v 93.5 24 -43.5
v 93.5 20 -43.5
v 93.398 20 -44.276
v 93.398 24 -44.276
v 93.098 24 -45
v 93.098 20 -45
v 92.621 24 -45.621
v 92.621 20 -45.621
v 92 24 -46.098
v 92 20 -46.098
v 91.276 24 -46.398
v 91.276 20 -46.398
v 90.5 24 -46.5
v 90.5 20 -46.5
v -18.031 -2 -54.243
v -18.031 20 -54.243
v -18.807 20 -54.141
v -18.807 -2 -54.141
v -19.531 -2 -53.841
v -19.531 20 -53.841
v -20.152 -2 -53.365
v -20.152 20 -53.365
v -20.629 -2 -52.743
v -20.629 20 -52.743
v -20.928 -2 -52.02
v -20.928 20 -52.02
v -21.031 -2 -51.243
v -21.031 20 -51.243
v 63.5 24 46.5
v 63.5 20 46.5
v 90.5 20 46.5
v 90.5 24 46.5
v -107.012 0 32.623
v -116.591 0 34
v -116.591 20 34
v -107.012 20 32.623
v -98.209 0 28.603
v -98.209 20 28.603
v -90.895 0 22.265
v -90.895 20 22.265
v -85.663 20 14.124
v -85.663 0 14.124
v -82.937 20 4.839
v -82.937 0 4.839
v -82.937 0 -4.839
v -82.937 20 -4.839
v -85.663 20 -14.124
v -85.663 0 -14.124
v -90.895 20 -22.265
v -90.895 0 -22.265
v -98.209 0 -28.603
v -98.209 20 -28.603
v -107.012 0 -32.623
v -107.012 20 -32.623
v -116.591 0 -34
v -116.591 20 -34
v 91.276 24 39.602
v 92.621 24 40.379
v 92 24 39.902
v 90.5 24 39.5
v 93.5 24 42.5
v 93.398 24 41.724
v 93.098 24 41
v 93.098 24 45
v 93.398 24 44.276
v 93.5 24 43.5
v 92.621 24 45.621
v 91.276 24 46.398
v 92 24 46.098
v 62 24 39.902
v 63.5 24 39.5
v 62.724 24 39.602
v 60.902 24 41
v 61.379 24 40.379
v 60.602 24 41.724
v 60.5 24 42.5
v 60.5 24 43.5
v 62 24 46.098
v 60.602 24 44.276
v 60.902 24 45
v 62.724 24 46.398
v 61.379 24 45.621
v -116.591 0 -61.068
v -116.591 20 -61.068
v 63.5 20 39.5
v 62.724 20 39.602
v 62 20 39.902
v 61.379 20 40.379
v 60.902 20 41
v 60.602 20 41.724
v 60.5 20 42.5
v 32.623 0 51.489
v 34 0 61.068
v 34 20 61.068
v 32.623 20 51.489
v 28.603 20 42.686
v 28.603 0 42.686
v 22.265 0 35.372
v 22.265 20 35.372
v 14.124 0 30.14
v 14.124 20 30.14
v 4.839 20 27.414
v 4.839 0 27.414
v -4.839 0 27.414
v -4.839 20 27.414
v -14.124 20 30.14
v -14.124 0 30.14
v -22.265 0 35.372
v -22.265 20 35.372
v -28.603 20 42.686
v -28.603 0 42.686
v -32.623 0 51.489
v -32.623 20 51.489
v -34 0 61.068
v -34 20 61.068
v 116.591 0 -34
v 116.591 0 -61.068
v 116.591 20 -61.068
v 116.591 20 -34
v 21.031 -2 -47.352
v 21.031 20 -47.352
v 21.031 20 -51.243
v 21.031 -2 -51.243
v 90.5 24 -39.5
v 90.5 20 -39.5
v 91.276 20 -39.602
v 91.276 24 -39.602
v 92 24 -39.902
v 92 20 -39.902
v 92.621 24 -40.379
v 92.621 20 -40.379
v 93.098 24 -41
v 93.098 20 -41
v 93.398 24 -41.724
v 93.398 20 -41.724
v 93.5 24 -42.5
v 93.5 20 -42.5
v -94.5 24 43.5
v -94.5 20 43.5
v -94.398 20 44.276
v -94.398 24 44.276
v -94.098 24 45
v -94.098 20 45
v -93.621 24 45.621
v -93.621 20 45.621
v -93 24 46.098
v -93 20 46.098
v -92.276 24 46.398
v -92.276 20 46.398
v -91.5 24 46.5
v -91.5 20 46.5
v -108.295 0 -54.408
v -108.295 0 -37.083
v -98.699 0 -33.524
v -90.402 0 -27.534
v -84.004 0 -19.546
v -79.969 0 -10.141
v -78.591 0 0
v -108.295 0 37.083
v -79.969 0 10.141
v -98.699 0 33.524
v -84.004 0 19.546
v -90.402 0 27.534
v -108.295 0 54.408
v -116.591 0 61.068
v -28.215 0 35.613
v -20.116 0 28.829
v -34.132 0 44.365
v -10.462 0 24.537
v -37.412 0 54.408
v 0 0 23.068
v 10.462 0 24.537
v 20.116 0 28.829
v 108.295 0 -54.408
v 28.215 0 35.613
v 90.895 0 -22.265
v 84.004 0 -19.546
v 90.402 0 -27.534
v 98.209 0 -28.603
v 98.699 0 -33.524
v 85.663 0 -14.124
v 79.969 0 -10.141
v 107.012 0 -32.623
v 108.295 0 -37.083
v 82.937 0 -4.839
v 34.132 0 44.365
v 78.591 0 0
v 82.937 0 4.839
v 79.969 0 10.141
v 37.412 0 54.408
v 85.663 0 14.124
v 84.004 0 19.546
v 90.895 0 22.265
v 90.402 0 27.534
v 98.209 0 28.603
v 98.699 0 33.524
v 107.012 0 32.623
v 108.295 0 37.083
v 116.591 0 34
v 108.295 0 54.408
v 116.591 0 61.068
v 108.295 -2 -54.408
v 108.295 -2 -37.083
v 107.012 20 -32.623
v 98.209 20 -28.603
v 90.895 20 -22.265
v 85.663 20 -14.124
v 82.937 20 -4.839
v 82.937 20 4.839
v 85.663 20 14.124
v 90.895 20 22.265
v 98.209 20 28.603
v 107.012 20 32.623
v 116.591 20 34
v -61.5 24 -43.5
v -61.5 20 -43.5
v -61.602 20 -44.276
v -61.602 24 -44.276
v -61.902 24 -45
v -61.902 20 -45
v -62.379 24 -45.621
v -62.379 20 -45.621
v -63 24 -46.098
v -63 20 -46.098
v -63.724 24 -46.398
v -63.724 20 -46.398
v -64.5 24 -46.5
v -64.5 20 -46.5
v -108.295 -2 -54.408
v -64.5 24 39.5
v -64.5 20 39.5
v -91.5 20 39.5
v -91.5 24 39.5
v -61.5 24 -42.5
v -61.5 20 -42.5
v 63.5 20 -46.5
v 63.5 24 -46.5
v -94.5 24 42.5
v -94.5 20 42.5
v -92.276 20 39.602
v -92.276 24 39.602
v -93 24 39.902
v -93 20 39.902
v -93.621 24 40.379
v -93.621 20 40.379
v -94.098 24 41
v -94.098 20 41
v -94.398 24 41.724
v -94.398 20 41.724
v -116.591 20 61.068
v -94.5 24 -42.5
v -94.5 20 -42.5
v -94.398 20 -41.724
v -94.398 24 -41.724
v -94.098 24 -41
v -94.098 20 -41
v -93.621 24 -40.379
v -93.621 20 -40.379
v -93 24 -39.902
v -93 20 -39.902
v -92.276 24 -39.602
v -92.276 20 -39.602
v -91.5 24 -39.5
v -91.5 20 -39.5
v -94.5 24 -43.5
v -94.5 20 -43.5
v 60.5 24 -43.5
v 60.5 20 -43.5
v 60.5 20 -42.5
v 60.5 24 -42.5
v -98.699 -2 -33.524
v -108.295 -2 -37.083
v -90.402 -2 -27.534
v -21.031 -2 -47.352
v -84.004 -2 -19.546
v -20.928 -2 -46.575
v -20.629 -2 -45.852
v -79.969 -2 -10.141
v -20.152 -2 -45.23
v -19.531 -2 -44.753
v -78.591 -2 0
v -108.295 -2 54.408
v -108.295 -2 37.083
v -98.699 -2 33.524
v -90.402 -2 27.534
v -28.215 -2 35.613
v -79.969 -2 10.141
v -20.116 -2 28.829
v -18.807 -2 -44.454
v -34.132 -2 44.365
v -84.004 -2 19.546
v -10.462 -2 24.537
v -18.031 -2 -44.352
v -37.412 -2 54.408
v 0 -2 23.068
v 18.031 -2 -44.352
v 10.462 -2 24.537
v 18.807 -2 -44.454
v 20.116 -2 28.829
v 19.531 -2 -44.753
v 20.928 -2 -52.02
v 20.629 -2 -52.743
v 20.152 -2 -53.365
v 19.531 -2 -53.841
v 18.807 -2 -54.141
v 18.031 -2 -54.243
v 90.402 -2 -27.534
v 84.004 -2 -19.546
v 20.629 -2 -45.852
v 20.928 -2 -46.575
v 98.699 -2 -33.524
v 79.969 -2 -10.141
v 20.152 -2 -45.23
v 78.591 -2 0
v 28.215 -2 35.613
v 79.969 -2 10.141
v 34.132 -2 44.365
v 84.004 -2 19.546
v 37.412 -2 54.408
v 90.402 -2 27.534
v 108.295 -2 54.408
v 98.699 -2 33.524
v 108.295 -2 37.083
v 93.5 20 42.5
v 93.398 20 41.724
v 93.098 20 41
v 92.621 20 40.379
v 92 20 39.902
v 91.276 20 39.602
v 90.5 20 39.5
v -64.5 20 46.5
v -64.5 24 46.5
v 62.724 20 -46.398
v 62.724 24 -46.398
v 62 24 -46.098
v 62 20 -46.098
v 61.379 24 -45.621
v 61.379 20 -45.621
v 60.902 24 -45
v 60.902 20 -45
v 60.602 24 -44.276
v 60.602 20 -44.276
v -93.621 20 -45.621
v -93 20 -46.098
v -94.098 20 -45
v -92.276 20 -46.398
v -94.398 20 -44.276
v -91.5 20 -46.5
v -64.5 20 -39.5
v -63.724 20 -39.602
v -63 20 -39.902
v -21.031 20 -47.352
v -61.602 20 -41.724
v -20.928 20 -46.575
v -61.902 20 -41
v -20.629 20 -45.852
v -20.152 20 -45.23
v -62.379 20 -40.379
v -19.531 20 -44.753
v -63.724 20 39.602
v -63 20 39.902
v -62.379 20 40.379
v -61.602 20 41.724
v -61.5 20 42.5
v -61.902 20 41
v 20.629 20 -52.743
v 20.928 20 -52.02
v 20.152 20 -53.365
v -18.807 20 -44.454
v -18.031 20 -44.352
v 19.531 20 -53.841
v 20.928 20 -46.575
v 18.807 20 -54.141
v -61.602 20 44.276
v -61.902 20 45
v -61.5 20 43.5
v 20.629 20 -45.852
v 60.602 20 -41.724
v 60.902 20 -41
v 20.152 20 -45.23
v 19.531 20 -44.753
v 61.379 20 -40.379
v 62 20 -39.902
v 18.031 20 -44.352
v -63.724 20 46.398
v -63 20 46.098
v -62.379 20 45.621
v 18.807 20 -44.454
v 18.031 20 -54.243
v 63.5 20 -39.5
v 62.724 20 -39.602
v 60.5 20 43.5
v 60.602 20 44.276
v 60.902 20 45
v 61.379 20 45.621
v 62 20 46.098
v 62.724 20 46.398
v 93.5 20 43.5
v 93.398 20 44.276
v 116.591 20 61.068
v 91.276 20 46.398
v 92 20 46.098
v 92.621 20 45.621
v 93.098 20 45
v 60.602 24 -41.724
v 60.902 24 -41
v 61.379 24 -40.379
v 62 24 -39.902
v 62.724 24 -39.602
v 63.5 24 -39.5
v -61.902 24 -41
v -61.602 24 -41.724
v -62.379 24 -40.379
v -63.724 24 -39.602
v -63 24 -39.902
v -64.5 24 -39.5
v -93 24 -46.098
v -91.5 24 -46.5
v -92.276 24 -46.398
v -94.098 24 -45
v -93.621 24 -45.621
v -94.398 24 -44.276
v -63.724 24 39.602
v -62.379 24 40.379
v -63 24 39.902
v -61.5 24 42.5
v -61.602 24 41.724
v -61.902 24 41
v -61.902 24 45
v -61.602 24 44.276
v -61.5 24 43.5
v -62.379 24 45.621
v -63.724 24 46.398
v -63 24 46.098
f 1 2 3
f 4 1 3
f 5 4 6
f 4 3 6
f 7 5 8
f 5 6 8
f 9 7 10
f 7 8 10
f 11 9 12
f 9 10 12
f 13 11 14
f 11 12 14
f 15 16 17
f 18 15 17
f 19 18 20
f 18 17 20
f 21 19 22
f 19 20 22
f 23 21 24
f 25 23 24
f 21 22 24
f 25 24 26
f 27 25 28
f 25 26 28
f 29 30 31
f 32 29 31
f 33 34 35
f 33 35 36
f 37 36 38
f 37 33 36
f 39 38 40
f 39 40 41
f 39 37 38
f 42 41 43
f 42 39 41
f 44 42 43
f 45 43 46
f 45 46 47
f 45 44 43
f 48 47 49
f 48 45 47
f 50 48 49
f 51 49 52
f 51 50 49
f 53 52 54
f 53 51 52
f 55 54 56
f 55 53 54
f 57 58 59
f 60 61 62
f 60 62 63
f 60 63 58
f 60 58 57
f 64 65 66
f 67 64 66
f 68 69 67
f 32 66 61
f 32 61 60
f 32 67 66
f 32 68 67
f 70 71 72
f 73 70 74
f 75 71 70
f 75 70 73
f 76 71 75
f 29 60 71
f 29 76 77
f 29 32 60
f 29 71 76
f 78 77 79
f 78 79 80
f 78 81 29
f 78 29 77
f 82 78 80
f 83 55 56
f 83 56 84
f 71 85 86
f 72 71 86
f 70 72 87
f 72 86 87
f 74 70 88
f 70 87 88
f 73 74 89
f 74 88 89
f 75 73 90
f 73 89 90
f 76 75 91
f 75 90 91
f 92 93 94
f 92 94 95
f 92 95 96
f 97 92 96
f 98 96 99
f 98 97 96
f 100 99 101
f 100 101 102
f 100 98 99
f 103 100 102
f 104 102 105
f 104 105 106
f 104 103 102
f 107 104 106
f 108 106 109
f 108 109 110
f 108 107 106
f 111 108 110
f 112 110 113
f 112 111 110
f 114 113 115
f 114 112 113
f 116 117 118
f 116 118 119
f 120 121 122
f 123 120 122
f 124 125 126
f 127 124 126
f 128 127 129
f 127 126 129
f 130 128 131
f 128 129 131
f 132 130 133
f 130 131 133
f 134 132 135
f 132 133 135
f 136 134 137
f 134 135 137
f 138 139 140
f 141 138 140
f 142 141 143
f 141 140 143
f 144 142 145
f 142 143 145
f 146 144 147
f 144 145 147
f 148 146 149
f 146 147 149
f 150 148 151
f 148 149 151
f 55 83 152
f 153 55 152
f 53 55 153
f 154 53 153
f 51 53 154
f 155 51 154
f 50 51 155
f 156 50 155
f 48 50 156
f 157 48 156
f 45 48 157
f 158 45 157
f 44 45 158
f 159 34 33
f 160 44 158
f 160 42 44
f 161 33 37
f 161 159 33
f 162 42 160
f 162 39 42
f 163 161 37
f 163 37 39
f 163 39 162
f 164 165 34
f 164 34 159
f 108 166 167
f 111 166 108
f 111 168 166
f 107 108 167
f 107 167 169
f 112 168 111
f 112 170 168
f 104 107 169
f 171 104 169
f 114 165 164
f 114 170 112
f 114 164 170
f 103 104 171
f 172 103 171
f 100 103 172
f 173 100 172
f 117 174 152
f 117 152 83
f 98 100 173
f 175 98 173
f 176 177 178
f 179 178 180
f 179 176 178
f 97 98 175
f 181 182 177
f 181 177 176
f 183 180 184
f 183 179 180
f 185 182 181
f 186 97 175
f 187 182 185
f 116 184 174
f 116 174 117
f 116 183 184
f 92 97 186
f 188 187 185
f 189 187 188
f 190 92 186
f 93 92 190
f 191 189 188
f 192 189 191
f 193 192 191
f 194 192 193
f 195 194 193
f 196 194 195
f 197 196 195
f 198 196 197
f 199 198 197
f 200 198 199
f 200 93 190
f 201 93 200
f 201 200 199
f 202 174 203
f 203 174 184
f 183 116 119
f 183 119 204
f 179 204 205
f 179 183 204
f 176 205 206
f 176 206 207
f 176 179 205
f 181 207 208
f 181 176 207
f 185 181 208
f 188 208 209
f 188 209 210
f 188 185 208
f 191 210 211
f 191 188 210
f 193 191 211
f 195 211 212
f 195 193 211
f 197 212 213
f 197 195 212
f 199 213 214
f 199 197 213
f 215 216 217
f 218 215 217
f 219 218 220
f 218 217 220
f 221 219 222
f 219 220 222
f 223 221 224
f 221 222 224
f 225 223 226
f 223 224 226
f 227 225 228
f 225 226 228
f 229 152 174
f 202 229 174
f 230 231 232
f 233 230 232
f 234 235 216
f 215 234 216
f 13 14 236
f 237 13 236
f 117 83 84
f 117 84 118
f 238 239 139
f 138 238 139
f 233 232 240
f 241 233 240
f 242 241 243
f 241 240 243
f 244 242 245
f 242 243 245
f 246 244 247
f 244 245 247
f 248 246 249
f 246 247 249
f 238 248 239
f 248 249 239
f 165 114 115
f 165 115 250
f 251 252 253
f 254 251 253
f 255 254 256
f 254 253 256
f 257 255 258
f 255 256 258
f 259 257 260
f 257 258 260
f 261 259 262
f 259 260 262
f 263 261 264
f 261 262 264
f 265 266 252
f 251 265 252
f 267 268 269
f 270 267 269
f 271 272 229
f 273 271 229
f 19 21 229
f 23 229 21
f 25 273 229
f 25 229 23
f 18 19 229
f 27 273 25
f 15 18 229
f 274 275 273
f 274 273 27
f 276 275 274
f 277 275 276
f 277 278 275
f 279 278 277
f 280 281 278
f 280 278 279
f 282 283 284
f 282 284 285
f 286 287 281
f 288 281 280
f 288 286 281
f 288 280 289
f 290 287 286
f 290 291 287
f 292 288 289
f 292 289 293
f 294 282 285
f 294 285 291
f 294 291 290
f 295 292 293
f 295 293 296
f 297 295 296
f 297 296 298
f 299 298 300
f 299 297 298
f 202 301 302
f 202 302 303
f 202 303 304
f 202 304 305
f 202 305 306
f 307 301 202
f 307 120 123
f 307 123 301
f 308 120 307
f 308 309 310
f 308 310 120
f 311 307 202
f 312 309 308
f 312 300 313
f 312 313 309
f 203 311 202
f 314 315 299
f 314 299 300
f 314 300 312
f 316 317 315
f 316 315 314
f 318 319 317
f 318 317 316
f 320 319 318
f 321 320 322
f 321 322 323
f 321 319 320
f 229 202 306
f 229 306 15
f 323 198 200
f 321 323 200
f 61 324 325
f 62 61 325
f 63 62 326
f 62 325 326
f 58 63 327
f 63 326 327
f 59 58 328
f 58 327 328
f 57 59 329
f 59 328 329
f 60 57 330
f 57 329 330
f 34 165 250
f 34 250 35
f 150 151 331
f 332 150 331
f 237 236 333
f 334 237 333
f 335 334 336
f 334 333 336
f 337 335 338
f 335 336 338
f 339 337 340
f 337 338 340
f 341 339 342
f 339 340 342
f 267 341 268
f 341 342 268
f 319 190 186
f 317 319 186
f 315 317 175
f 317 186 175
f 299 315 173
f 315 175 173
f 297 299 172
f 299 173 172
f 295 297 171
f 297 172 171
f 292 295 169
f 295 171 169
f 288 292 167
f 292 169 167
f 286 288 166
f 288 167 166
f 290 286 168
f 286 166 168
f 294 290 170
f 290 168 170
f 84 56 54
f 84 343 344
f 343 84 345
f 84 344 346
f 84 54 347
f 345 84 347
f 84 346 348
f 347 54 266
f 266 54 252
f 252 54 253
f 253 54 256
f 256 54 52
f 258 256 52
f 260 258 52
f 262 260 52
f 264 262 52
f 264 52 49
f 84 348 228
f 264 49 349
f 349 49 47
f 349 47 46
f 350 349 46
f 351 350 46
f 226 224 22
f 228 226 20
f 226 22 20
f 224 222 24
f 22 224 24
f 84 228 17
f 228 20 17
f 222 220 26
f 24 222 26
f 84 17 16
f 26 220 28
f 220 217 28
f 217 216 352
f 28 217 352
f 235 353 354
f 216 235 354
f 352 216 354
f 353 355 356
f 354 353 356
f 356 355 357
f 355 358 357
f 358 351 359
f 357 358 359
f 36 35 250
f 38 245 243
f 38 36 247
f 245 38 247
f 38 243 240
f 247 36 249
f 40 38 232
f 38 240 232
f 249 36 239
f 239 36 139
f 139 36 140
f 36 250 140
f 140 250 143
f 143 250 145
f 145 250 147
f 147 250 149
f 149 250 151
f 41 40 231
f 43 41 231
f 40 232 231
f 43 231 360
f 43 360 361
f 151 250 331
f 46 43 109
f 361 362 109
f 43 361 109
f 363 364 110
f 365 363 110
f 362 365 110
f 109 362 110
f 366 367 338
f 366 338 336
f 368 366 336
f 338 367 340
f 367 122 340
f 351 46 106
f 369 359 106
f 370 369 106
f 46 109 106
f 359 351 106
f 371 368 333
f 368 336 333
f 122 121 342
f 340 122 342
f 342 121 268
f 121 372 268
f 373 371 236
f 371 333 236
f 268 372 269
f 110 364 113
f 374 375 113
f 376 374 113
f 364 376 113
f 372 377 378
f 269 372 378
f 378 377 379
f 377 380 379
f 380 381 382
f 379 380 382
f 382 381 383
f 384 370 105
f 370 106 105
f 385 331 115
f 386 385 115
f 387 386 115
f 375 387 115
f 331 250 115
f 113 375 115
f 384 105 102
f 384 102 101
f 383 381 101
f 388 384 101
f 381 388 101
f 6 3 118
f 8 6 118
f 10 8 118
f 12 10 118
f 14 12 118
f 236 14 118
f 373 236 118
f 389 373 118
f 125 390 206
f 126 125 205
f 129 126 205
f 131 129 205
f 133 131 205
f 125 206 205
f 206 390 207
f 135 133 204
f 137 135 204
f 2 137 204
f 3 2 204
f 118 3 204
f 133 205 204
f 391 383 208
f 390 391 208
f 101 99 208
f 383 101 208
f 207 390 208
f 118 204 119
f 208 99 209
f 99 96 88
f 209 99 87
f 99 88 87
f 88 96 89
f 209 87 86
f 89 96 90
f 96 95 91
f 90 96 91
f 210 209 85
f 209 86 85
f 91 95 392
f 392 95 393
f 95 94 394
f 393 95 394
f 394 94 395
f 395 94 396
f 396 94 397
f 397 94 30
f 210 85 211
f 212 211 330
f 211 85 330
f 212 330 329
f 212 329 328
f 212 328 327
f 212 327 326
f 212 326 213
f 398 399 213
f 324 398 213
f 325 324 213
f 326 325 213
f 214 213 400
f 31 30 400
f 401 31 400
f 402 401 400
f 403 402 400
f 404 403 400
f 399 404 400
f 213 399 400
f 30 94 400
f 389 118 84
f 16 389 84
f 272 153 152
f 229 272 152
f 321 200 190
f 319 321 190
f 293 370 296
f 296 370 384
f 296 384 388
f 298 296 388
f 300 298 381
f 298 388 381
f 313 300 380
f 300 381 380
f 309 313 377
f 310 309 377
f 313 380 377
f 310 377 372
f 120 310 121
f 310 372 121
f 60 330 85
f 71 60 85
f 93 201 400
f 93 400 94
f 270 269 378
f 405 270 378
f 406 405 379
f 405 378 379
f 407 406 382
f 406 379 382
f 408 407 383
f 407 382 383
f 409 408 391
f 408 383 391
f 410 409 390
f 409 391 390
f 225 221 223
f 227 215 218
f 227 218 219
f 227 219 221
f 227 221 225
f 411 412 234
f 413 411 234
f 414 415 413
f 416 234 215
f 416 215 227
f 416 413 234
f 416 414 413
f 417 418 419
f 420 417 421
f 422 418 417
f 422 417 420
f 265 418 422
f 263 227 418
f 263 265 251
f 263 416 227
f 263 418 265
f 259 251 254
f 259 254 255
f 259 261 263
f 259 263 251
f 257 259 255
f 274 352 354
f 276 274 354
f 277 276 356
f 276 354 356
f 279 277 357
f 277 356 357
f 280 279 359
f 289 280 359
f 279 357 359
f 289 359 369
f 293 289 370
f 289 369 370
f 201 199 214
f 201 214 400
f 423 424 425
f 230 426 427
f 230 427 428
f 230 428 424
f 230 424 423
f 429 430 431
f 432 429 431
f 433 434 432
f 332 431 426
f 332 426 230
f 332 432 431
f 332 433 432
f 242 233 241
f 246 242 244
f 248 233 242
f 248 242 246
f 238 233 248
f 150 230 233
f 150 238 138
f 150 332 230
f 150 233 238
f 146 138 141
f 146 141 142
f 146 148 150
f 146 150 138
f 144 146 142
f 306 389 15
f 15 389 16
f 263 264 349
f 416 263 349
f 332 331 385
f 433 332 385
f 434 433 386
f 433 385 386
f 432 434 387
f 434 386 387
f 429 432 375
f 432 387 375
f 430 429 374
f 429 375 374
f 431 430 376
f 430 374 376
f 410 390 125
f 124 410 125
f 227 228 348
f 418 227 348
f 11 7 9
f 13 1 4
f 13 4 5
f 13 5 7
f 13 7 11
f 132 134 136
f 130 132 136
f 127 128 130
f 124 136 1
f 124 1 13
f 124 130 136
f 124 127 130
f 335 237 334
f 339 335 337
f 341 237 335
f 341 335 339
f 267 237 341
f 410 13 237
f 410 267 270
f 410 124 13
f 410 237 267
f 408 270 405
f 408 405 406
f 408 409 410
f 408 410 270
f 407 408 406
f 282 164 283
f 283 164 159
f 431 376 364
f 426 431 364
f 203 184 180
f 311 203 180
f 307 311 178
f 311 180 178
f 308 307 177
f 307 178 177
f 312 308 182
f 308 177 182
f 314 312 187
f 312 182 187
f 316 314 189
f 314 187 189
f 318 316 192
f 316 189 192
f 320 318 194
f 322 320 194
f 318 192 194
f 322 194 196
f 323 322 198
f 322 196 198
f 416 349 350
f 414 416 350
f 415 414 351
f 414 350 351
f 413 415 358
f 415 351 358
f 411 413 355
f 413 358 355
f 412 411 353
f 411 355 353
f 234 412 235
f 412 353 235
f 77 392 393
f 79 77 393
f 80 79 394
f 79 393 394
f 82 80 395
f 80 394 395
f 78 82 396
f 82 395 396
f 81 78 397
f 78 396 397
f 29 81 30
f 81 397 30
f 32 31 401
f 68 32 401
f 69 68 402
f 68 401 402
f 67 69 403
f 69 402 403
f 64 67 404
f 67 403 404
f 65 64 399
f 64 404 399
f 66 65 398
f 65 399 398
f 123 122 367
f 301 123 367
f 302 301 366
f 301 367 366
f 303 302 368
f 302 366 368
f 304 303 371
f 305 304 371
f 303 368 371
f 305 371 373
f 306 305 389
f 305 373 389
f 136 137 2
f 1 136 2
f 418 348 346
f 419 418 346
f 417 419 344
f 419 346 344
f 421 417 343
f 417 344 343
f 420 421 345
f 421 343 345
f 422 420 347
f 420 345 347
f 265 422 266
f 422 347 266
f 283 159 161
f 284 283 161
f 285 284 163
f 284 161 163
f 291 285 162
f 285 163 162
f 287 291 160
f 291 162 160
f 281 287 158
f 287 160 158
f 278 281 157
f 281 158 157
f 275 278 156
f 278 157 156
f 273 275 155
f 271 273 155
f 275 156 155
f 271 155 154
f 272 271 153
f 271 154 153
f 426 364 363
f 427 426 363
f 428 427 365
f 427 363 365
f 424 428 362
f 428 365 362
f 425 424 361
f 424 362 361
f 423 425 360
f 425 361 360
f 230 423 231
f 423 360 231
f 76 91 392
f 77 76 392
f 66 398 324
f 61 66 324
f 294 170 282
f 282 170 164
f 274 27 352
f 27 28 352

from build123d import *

# Parameters (mm, degrees)
F1_DEPTH = 20
F3_DEPTH = 2
F5_DEPTH = 4
F6_DEPTH = 4


with BuildPart() as f1:
    # F0 (on Front) → F1 (new body)
    with BuildSketch(Plane.XZ):
        with BuildLine():
            Line((116.590939, 34), (116.590939, 61.067935))
            Line((116.590939, 61.067935), (34, 61.067935))
            ThreePointArc((34, 61.067935), (0, 27.067935), (-34, 61.067935))
            Line((-34, 61.067935), (-116.590939, 61.067935))
            Line((-116.590939, 61.067935), (-116.590939, 34))
            ThreePointArc((-116.590939, 34), (-82.590939, 0), (-116.590939, -34))
            Line((-116.590939, -34), (-116.590939, -61.067935))
            Line((-116.590939, -61.067935), (34, -61.067935))
            Line((34, -61.067935), (116.590939, -61.067935))
            Line((116.590939, -61.067935), (116.590939, -34))
            ThreePointArc((116.590939, -34), (82.590939, 0), (116.590939, 34))
        make_face()
        with BuildLine():
            Line((-18.030702, -44.351537), (18.030702, -44.351537))
            ThreePointArc((18.030702, -44.351537), (20.152022, -45.230216), (21.030702, -47.351537))
            Line((21.030702, -47.351537), (21.030702, -51.243211))
            ThreePointArc((21.030702, -51.243211), (20.152022, -53.364531), (18.030702, -54.243211))
            Line((18.030702, -54.243211), (-18.030702, -54.243211))
            ThreePointArc((-18.030702, -54.243211), (-20.152022, -53.364531), (-21.030702, -51.243211))
            Line((-21.030702, -51.243211), (-21.030702, -47.351537))
            ThreePointArc((-21.030702, -47.351537), (-20.152022, -45.230216), (-18.030702, -44.351537))
        make_face(mode=Mode.SUBTRACT)
    extrude(amount=-F1_DEPTH)

    # F2 (on face) → F3 (join)
    with BuildSketch(Plane.XZ):
        with BuildLine():
            Line((108.294822, 37.083345), (108.294822, 54.408085))
            Line((108.294822, 54.408085), (37.411848, 54.408085))
            ThreePointArc((37.411848, 54.408085), (0, 23.067935), (-37.411848, 54.408085))
            Line((-37.411848, 54.408085), (-108.294822, 54.408085))
            Line((-108.294822, 54.408085), (-108.294822, 37.083345))
            ThreePointArc((-108.294822, 37.083345), (-78.590939, 0), (-108.294822, -37.083345))
            Line((-108.294822, -37.083345), (-108.294822, -54.408085))
            Line((-108.294822, -54.408085), (108.294822, -54.408085))
            Line((108.294822, -54.408085), (108.294822, -37.083345))
            ThreePointArc((108.294822, -37.083345), (78.590939, 0), (108.294822, 37.083345))
        make_face()
        with BuildLine():
            Line((-21.030702, -51.243211), (-21.030702, -47.351537))
            ThreePointArc((-21.030702, -47.351537), (-20.152022, -45.230216), (-18.030702, -44.351537))
            Line((-18.030702, -44.351537), (18.030702, -44.351537))
            ThreePointArc((18.030702, -44.351537), (20.152022, -45.230216), (21.030702, -47.351537))
            Line((21.030702, -47.351537), (21.030702, -51.243211))
            ThreePointArc((21.030702, -51.243211), (20.152022, -53.364531), (18.030702, -54.243211))
            Line((18.030702, -54.243211), (-18.030702, -54.243211))
            ThreePointArc((-18.030702, -54.243211), (-20.152022, -53.364531), (-21.030702, -51.243211))
        make_face(mode=Mode.SUBTRACT)
    extrude(amount=F3_DEPTH)

    # F4 (on face) → F5 (join)
    with BuildSketch(Plane(origin=(0, 20, 0), x_dir=(-1, 0, 0), z_dir=(0, 1, 0))):
        with BuildLine():
            ThreePointArc((-60.5, 43.5), (-61.37868, 45.62132), (-63.5, 46.5))
            Line((-63.5, 46.5), (-90.5, 46.5))
            ThreePointArc((-90.5, 46.5), (-92.62132, 45.62132), (-93.5, 43.5))
            Line((-93.5, 43.5), (-93.5, 42.5))
            ThreePointArc((-93.5, 42.5), (-92.62132, 40.37868), (-90.5, 39.5))
            Line((-90.5, 39.5), (-63.5, 39.5))
            ThreePointArc((-63.5, 39.5), (-61.37868, 40.37868), (-60.5, 42.5))
            Line((-60.5, 42.5), (-60.5, 43.5))
        make_face()
    extrude(amount=F5_DEPTH)

    # F4 (on face) → F6 (join)
    with BuildSketch(Plane(origin=(0, 20, 0), x_dir=(-1, 0, 0), z_dir=(0, 1, 0))):
        with BuildLine():
            ThreePointArc((-60.5, 43.5), (-61.37868, 45.62132), (-63.5, 46.5))
            Line((-63.5, 46.5), (-90.5, 46.5))
            ThreePointArc((-90.5, 46.5), (-92.62132, 45.62132), (-93.5, 43.5))
            Line((-93.5, 43.5), (-93.5, 42.5))
            ThreePointArc((-93.5, 42.5), (-92.62132, 40.37868), (-90.5, 39.5))
            Line((-90.5, 39.5), (-63.5, 39.5))
            ThreePointArc((-63.5, 39.5), (-61.37868, 40.37868), (-60.5, 42.5))
            Line((-60.5, 42.5), (-60.5, 43.5))
        make_face()
        with BuildLine():
            ThreePointArc((-60.5, -42.5), (-61.37868, -40.37868), (-63.5, -39.5))
            Line((-63.5, -39.5), (-90.5, -39.5))
            ThreePointArc((-90.5, -39.5), (-92.62132, -40.37868), (-93.5, -42.5))
            Line((-93.5, -42.5), (-93.5, -43.5))
            ThreePointArc((-93.5, -43.5), (-92.62132, -45.62132), (-90.5, -46.5))
            Line((-90.5, -46.5), (-63.5, -46.5))
            ThreePointArc((-63.5, -46.5), (-61.37868, -45.62132), (-60.5, -43.5))
            Line((-60.5, -43.5), (-60.5, -42.5))
        make_face()
        with BuildLine():
            Line((91.5, 46.5), (64.5, 46.5))
            ThreePointArc((64.5, 46.5), (62.37868, 45.62132), (61.5, 43.5))
            Line((61.5, 43.5), (61.5, 42.5))
            ThreePointArc((61.5, 42.5), (62.37868, 40.37868), (64.5, 39.5))
            Line((64.5, 39.5), (91.5, 39.5))
            ThreePointArc((91.5, 39.5), (93.62132, 40.37868), (94.5, 42.5))
            Line((94.5, 42.5), (94.5, 43.5))
            ThreePointArc((94.5, 43.5), (93.62132, 45.62132), (91.5, 46.5))
        make_face()
        with BuildLine():
            Line((91.5, -39.5), (64.5, -39.5))
            ThreePointArc((64.5, -39.5), (62.37868, -40.37868), (61.5, -42.5))
            Line((61.5, -42.5), (61.5, -43.5))
            ThreePointArc((61.5, -43.5), (62.37868, -45.62132), (64.5, -46.5))
            Line((64.5, -46.5), (91.5, -46.5))
            ThreePointArc((91.5, -46.5), (93.62132, -45.62132), (94.5, -43.5))
            Line((94.5, -43.5), (94.5, -42.5))
            ThreePointArc((94.5, -42.5), (93.62132, -40.37868), (91.5, -39.5))
        make_face()
    extrude(amount=F6_DEPTH)


solid = f1.part
